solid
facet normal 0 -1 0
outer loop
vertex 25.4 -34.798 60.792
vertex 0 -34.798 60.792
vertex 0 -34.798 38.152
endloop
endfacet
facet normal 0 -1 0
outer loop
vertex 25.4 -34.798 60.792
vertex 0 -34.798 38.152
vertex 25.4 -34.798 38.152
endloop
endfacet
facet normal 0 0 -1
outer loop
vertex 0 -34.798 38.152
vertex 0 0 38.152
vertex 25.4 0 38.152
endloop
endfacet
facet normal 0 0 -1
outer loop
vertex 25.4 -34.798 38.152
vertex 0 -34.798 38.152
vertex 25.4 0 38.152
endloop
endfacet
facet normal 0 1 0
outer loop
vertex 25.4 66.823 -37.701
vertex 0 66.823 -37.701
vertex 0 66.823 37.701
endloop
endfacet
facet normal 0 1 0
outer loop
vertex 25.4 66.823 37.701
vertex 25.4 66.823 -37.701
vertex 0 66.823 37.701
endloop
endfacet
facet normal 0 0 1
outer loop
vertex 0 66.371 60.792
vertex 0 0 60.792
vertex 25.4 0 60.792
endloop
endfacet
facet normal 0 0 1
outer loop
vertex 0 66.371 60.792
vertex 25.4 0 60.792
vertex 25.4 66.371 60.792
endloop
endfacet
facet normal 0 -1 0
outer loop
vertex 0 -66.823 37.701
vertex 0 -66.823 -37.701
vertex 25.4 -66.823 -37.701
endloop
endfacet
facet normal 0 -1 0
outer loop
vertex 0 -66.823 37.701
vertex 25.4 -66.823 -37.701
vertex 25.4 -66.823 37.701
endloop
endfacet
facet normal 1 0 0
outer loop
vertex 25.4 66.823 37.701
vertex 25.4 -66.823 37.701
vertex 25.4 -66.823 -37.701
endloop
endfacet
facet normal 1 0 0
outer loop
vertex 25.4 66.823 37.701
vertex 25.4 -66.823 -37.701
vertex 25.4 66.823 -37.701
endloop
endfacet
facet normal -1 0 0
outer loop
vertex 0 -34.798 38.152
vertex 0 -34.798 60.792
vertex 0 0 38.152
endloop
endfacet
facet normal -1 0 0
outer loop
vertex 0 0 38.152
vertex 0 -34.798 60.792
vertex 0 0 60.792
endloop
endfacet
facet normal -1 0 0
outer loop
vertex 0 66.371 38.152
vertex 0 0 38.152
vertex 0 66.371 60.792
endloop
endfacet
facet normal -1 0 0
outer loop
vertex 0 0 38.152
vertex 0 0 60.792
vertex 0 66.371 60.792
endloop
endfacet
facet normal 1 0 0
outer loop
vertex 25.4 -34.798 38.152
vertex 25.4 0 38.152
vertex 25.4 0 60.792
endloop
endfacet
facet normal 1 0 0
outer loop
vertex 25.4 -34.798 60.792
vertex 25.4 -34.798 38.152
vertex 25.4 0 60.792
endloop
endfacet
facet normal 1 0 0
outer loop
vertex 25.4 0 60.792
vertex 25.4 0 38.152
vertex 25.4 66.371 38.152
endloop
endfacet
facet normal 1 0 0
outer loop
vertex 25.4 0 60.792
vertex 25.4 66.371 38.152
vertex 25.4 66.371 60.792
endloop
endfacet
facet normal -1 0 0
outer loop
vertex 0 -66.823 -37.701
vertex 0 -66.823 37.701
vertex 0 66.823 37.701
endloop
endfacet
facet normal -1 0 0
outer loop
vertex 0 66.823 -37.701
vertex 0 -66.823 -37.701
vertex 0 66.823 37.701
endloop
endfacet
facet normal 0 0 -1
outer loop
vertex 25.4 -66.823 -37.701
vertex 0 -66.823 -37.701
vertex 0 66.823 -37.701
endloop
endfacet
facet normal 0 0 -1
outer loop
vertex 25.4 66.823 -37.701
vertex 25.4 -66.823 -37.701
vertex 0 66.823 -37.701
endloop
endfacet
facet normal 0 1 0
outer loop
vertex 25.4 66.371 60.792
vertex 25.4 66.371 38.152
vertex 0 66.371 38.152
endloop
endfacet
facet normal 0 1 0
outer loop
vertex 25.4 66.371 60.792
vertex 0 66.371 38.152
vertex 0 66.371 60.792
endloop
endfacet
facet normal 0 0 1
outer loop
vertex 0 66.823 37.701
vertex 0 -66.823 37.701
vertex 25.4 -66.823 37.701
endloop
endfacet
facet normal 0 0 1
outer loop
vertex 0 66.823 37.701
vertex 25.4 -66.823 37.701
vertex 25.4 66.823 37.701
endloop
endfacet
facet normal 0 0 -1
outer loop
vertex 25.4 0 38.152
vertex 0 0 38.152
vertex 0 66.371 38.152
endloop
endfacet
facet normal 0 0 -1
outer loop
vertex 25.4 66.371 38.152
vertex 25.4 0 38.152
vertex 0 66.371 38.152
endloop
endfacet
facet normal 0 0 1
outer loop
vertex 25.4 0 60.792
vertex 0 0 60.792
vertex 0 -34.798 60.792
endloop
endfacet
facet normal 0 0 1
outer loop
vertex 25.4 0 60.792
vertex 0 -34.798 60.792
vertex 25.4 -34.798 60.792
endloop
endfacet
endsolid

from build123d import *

# Parameters (mm, degrees)
F0_W      = 133.645922
F0_H      = 75.401596
F1_DEPTH  = 25.4
F2_W      = 66.371463
F2_H      = 22.640005
F3_DEPTH  = 25.4
F3_FACE_W = 25.4
F3_FACE_H = 22.640004
F4_DEPTH  = 34.798


with BuildPart() as f1:
    # F0 (on Right) → F1 (new body)
    with BuildSketch(Plane.YZ):
        Rectangle(F0_W, F0_H)
    extrude(amount=F1_DEPTH)


with BuildPart() as f3:
    # F2 (on Right) → F3 (new body)
    with BuildSketch(Plane.YZ):
        with Locations((33.185731, 49.472302)):
            Rectangle(F2_W, F2_H)
    extrude(amount=F3_DEPTH)

    # F3_face (on face) → F4 (join)
    with BuildSketch(Plane(origin=(12.7, 0, 49.472302), x_dir=(1, 0, 0), z_dir=(0, -1, 0))):
        Rectangle(F3_FACE_W, F3_FACE_H)
    extrude(amount=F4_DEPTH)


solid = Compound([f1.part, f3.part])
